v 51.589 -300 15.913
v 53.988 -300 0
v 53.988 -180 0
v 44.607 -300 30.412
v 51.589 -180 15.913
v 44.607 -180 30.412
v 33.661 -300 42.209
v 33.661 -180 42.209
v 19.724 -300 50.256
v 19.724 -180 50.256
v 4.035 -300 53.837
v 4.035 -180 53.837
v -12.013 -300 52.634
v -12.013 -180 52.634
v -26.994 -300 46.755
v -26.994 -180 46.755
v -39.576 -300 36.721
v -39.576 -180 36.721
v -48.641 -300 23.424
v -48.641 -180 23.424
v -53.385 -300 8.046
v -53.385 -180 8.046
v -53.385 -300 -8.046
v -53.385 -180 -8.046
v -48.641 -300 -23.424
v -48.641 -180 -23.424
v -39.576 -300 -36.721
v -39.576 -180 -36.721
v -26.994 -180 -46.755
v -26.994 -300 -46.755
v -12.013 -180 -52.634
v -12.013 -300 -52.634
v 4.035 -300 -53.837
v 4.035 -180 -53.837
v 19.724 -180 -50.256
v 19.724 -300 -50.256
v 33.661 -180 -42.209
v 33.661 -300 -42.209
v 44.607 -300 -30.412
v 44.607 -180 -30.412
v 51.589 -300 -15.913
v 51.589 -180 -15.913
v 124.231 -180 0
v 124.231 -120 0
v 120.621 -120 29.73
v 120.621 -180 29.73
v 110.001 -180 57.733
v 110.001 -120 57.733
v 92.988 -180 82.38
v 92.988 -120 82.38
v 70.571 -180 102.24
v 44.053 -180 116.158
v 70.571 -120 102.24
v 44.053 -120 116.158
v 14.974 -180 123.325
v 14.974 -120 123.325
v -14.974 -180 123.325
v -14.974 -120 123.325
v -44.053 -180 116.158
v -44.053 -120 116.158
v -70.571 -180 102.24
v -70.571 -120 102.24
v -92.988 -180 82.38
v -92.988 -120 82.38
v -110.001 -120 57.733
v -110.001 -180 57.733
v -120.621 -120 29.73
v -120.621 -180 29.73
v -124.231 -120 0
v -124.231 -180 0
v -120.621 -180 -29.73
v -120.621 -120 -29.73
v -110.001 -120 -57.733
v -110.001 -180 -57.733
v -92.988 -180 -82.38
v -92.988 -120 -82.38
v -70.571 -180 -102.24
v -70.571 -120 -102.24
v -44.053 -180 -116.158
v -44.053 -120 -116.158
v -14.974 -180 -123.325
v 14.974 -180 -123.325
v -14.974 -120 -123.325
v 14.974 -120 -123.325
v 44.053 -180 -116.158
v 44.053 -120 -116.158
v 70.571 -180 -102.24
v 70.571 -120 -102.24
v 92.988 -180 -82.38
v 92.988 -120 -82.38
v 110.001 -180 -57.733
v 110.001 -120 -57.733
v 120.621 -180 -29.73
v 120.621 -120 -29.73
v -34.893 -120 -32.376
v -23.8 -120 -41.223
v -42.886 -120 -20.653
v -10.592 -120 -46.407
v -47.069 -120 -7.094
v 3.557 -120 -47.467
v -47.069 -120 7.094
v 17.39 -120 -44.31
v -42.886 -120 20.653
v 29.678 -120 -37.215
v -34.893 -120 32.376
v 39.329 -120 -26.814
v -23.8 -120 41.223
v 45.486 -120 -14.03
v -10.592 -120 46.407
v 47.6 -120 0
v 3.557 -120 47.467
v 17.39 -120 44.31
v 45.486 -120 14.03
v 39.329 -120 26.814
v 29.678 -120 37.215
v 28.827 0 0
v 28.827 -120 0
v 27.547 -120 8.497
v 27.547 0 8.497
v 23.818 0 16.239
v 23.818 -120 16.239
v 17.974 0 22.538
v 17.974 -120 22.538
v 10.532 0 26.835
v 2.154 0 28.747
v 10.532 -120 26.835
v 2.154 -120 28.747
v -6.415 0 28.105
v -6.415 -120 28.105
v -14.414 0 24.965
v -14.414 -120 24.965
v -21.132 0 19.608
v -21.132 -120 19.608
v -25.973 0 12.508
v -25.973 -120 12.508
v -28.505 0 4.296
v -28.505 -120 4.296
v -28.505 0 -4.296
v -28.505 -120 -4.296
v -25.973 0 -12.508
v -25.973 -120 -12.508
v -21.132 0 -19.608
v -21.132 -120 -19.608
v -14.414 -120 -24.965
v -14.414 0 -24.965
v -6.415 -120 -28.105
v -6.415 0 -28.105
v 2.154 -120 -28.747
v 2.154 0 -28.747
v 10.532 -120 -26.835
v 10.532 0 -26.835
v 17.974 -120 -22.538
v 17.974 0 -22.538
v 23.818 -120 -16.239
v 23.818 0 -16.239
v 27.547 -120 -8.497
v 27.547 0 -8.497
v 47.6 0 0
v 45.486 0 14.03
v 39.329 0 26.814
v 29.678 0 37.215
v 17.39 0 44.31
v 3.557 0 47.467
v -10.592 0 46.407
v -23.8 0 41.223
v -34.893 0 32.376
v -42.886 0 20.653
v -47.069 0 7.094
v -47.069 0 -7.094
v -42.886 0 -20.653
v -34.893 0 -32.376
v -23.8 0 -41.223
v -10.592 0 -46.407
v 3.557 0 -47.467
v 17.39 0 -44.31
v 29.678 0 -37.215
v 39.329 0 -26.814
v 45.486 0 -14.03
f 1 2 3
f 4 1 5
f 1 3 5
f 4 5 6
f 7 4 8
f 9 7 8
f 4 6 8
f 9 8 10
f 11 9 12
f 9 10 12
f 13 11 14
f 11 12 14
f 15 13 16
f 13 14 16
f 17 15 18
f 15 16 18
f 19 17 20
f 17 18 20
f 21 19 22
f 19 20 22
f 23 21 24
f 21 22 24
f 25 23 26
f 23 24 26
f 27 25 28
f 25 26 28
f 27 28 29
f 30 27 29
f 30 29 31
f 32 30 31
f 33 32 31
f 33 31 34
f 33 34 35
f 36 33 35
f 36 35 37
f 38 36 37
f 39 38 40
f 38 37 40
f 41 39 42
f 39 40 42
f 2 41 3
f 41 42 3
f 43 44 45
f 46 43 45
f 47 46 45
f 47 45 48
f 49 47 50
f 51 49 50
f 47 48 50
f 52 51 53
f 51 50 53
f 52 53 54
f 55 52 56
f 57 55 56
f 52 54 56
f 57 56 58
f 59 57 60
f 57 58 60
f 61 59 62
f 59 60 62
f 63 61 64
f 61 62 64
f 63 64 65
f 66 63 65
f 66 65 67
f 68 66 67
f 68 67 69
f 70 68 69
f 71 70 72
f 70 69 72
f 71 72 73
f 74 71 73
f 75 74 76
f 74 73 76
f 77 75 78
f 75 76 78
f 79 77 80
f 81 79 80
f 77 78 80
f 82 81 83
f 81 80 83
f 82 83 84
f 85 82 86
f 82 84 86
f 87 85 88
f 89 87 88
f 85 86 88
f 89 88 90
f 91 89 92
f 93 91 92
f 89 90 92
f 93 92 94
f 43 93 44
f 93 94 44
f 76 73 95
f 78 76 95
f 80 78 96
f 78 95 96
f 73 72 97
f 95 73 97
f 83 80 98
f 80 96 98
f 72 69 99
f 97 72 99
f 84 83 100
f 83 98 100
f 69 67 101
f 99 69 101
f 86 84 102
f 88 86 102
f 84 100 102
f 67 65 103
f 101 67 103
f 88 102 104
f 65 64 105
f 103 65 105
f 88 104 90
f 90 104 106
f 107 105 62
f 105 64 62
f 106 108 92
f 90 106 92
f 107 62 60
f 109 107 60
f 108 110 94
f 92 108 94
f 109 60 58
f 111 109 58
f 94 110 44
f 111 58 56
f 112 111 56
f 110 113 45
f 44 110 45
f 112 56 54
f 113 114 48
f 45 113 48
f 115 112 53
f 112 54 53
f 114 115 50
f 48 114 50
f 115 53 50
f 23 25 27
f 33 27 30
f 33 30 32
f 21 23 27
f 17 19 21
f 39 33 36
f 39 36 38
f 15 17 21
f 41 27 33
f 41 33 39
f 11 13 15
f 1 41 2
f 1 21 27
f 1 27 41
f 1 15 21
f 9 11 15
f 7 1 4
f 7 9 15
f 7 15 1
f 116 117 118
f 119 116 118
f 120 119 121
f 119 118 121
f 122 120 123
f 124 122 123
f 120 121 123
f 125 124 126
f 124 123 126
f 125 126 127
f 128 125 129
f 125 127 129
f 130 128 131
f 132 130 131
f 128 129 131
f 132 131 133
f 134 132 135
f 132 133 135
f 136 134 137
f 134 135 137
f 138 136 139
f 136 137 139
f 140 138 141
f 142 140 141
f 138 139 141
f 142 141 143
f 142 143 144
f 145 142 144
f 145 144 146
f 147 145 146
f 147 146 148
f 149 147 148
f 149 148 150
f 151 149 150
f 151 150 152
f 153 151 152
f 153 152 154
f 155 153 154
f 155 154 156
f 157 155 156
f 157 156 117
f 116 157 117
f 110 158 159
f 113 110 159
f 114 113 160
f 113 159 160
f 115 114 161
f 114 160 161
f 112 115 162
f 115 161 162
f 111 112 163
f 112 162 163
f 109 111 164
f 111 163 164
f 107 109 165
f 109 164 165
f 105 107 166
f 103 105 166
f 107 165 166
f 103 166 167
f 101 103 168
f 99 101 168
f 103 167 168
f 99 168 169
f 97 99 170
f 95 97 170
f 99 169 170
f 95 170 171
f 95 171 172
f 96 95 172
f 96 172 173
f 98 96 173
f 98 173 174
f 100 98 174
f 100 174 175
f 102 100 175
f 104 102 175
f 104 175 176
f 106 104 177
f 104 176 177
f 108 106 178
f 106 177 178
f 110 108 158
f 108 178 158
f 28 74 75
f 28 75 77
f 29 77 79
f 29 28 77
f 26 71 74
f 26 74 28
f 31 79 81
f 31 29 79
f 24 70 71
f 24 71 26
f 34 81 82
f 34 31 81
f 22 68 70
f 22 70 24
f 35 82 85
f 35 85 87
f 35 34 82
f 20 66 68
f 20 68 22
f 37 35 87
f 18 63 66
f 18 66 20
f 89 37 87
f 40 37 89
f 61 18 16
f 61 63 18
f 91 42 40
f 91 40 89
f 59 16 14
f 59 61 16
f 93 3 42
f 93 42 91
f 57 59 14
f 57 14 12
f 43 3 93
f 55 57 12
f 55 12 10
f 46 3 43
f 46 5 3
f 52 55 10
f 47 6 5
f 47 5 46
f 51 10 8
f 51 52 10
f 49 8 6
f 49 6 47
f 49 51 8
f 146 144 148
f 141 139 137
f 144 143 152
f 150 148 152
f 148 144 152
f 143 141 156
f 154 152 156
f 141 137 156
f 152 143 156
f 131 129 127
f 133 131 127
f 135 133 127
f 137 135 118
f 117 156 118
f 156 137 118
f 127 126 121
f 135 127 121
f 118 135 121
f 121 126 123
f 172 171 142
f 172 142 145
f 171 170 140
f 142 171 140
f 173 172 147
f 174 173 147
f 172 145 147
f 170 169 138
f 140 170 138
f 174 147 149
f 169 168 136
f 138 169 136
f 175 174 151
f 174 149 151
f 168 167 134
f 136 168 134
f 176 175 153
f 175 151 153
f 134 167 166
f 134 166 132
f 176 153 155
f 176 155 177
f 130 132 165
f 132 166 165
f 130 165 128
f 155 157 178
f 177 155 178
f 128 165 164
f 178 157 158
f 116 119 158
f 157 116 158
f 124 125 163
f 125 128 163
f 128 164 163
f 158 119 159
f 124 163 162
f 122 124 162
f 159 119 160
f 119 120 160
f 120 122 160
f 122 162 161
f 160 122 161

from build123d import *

# Parameters (mm, degrees)
F0_R     = 47.600257
F1_DEPTH = 120
F2_R     = 28.82737
F3_DEPTH = 120.001
F4_R     = 124.230841
F4_R_2   = 28.82737
F5_DEPTH = 60
F8_R     = 53.98765
F9_DEPTH = 120


with BuildPart() as f1:
    # F0 (on Front) → F1 (new body)
    with BuildSketch(Plane.XZ):
        Circle(F0_R)
    extrude(amount=F1_DEPTH)

    # F2 (on face) → F3 (cut, through all)
    with BuildSketch(Plane.XZ.offset(120)):
        Circle(F2_R)
    extrude(amount=-F3_DEPTH, mode=Mode.SUBTRACT)

    # F2 (on face) + F4 (on face) → F5 (join)
    with BuildSketch(Plane.XZ.offset(120)):
        Circle(F2_R)
    with BuildSketch(Plane.XZ.offset(120)):
        Circle(F4_R)
        Circle(F4_R_2, mode=Mode.SUBTRACT)
    extrude(amount=F5_DEPTH)

    # F8 (on face) → F9 (join)
    with BuildSketch(Plane.XZ.offset(180)):
        Circle(F8_R)
    extrude(amount=F9_DEPTH)


solid = f1.part
